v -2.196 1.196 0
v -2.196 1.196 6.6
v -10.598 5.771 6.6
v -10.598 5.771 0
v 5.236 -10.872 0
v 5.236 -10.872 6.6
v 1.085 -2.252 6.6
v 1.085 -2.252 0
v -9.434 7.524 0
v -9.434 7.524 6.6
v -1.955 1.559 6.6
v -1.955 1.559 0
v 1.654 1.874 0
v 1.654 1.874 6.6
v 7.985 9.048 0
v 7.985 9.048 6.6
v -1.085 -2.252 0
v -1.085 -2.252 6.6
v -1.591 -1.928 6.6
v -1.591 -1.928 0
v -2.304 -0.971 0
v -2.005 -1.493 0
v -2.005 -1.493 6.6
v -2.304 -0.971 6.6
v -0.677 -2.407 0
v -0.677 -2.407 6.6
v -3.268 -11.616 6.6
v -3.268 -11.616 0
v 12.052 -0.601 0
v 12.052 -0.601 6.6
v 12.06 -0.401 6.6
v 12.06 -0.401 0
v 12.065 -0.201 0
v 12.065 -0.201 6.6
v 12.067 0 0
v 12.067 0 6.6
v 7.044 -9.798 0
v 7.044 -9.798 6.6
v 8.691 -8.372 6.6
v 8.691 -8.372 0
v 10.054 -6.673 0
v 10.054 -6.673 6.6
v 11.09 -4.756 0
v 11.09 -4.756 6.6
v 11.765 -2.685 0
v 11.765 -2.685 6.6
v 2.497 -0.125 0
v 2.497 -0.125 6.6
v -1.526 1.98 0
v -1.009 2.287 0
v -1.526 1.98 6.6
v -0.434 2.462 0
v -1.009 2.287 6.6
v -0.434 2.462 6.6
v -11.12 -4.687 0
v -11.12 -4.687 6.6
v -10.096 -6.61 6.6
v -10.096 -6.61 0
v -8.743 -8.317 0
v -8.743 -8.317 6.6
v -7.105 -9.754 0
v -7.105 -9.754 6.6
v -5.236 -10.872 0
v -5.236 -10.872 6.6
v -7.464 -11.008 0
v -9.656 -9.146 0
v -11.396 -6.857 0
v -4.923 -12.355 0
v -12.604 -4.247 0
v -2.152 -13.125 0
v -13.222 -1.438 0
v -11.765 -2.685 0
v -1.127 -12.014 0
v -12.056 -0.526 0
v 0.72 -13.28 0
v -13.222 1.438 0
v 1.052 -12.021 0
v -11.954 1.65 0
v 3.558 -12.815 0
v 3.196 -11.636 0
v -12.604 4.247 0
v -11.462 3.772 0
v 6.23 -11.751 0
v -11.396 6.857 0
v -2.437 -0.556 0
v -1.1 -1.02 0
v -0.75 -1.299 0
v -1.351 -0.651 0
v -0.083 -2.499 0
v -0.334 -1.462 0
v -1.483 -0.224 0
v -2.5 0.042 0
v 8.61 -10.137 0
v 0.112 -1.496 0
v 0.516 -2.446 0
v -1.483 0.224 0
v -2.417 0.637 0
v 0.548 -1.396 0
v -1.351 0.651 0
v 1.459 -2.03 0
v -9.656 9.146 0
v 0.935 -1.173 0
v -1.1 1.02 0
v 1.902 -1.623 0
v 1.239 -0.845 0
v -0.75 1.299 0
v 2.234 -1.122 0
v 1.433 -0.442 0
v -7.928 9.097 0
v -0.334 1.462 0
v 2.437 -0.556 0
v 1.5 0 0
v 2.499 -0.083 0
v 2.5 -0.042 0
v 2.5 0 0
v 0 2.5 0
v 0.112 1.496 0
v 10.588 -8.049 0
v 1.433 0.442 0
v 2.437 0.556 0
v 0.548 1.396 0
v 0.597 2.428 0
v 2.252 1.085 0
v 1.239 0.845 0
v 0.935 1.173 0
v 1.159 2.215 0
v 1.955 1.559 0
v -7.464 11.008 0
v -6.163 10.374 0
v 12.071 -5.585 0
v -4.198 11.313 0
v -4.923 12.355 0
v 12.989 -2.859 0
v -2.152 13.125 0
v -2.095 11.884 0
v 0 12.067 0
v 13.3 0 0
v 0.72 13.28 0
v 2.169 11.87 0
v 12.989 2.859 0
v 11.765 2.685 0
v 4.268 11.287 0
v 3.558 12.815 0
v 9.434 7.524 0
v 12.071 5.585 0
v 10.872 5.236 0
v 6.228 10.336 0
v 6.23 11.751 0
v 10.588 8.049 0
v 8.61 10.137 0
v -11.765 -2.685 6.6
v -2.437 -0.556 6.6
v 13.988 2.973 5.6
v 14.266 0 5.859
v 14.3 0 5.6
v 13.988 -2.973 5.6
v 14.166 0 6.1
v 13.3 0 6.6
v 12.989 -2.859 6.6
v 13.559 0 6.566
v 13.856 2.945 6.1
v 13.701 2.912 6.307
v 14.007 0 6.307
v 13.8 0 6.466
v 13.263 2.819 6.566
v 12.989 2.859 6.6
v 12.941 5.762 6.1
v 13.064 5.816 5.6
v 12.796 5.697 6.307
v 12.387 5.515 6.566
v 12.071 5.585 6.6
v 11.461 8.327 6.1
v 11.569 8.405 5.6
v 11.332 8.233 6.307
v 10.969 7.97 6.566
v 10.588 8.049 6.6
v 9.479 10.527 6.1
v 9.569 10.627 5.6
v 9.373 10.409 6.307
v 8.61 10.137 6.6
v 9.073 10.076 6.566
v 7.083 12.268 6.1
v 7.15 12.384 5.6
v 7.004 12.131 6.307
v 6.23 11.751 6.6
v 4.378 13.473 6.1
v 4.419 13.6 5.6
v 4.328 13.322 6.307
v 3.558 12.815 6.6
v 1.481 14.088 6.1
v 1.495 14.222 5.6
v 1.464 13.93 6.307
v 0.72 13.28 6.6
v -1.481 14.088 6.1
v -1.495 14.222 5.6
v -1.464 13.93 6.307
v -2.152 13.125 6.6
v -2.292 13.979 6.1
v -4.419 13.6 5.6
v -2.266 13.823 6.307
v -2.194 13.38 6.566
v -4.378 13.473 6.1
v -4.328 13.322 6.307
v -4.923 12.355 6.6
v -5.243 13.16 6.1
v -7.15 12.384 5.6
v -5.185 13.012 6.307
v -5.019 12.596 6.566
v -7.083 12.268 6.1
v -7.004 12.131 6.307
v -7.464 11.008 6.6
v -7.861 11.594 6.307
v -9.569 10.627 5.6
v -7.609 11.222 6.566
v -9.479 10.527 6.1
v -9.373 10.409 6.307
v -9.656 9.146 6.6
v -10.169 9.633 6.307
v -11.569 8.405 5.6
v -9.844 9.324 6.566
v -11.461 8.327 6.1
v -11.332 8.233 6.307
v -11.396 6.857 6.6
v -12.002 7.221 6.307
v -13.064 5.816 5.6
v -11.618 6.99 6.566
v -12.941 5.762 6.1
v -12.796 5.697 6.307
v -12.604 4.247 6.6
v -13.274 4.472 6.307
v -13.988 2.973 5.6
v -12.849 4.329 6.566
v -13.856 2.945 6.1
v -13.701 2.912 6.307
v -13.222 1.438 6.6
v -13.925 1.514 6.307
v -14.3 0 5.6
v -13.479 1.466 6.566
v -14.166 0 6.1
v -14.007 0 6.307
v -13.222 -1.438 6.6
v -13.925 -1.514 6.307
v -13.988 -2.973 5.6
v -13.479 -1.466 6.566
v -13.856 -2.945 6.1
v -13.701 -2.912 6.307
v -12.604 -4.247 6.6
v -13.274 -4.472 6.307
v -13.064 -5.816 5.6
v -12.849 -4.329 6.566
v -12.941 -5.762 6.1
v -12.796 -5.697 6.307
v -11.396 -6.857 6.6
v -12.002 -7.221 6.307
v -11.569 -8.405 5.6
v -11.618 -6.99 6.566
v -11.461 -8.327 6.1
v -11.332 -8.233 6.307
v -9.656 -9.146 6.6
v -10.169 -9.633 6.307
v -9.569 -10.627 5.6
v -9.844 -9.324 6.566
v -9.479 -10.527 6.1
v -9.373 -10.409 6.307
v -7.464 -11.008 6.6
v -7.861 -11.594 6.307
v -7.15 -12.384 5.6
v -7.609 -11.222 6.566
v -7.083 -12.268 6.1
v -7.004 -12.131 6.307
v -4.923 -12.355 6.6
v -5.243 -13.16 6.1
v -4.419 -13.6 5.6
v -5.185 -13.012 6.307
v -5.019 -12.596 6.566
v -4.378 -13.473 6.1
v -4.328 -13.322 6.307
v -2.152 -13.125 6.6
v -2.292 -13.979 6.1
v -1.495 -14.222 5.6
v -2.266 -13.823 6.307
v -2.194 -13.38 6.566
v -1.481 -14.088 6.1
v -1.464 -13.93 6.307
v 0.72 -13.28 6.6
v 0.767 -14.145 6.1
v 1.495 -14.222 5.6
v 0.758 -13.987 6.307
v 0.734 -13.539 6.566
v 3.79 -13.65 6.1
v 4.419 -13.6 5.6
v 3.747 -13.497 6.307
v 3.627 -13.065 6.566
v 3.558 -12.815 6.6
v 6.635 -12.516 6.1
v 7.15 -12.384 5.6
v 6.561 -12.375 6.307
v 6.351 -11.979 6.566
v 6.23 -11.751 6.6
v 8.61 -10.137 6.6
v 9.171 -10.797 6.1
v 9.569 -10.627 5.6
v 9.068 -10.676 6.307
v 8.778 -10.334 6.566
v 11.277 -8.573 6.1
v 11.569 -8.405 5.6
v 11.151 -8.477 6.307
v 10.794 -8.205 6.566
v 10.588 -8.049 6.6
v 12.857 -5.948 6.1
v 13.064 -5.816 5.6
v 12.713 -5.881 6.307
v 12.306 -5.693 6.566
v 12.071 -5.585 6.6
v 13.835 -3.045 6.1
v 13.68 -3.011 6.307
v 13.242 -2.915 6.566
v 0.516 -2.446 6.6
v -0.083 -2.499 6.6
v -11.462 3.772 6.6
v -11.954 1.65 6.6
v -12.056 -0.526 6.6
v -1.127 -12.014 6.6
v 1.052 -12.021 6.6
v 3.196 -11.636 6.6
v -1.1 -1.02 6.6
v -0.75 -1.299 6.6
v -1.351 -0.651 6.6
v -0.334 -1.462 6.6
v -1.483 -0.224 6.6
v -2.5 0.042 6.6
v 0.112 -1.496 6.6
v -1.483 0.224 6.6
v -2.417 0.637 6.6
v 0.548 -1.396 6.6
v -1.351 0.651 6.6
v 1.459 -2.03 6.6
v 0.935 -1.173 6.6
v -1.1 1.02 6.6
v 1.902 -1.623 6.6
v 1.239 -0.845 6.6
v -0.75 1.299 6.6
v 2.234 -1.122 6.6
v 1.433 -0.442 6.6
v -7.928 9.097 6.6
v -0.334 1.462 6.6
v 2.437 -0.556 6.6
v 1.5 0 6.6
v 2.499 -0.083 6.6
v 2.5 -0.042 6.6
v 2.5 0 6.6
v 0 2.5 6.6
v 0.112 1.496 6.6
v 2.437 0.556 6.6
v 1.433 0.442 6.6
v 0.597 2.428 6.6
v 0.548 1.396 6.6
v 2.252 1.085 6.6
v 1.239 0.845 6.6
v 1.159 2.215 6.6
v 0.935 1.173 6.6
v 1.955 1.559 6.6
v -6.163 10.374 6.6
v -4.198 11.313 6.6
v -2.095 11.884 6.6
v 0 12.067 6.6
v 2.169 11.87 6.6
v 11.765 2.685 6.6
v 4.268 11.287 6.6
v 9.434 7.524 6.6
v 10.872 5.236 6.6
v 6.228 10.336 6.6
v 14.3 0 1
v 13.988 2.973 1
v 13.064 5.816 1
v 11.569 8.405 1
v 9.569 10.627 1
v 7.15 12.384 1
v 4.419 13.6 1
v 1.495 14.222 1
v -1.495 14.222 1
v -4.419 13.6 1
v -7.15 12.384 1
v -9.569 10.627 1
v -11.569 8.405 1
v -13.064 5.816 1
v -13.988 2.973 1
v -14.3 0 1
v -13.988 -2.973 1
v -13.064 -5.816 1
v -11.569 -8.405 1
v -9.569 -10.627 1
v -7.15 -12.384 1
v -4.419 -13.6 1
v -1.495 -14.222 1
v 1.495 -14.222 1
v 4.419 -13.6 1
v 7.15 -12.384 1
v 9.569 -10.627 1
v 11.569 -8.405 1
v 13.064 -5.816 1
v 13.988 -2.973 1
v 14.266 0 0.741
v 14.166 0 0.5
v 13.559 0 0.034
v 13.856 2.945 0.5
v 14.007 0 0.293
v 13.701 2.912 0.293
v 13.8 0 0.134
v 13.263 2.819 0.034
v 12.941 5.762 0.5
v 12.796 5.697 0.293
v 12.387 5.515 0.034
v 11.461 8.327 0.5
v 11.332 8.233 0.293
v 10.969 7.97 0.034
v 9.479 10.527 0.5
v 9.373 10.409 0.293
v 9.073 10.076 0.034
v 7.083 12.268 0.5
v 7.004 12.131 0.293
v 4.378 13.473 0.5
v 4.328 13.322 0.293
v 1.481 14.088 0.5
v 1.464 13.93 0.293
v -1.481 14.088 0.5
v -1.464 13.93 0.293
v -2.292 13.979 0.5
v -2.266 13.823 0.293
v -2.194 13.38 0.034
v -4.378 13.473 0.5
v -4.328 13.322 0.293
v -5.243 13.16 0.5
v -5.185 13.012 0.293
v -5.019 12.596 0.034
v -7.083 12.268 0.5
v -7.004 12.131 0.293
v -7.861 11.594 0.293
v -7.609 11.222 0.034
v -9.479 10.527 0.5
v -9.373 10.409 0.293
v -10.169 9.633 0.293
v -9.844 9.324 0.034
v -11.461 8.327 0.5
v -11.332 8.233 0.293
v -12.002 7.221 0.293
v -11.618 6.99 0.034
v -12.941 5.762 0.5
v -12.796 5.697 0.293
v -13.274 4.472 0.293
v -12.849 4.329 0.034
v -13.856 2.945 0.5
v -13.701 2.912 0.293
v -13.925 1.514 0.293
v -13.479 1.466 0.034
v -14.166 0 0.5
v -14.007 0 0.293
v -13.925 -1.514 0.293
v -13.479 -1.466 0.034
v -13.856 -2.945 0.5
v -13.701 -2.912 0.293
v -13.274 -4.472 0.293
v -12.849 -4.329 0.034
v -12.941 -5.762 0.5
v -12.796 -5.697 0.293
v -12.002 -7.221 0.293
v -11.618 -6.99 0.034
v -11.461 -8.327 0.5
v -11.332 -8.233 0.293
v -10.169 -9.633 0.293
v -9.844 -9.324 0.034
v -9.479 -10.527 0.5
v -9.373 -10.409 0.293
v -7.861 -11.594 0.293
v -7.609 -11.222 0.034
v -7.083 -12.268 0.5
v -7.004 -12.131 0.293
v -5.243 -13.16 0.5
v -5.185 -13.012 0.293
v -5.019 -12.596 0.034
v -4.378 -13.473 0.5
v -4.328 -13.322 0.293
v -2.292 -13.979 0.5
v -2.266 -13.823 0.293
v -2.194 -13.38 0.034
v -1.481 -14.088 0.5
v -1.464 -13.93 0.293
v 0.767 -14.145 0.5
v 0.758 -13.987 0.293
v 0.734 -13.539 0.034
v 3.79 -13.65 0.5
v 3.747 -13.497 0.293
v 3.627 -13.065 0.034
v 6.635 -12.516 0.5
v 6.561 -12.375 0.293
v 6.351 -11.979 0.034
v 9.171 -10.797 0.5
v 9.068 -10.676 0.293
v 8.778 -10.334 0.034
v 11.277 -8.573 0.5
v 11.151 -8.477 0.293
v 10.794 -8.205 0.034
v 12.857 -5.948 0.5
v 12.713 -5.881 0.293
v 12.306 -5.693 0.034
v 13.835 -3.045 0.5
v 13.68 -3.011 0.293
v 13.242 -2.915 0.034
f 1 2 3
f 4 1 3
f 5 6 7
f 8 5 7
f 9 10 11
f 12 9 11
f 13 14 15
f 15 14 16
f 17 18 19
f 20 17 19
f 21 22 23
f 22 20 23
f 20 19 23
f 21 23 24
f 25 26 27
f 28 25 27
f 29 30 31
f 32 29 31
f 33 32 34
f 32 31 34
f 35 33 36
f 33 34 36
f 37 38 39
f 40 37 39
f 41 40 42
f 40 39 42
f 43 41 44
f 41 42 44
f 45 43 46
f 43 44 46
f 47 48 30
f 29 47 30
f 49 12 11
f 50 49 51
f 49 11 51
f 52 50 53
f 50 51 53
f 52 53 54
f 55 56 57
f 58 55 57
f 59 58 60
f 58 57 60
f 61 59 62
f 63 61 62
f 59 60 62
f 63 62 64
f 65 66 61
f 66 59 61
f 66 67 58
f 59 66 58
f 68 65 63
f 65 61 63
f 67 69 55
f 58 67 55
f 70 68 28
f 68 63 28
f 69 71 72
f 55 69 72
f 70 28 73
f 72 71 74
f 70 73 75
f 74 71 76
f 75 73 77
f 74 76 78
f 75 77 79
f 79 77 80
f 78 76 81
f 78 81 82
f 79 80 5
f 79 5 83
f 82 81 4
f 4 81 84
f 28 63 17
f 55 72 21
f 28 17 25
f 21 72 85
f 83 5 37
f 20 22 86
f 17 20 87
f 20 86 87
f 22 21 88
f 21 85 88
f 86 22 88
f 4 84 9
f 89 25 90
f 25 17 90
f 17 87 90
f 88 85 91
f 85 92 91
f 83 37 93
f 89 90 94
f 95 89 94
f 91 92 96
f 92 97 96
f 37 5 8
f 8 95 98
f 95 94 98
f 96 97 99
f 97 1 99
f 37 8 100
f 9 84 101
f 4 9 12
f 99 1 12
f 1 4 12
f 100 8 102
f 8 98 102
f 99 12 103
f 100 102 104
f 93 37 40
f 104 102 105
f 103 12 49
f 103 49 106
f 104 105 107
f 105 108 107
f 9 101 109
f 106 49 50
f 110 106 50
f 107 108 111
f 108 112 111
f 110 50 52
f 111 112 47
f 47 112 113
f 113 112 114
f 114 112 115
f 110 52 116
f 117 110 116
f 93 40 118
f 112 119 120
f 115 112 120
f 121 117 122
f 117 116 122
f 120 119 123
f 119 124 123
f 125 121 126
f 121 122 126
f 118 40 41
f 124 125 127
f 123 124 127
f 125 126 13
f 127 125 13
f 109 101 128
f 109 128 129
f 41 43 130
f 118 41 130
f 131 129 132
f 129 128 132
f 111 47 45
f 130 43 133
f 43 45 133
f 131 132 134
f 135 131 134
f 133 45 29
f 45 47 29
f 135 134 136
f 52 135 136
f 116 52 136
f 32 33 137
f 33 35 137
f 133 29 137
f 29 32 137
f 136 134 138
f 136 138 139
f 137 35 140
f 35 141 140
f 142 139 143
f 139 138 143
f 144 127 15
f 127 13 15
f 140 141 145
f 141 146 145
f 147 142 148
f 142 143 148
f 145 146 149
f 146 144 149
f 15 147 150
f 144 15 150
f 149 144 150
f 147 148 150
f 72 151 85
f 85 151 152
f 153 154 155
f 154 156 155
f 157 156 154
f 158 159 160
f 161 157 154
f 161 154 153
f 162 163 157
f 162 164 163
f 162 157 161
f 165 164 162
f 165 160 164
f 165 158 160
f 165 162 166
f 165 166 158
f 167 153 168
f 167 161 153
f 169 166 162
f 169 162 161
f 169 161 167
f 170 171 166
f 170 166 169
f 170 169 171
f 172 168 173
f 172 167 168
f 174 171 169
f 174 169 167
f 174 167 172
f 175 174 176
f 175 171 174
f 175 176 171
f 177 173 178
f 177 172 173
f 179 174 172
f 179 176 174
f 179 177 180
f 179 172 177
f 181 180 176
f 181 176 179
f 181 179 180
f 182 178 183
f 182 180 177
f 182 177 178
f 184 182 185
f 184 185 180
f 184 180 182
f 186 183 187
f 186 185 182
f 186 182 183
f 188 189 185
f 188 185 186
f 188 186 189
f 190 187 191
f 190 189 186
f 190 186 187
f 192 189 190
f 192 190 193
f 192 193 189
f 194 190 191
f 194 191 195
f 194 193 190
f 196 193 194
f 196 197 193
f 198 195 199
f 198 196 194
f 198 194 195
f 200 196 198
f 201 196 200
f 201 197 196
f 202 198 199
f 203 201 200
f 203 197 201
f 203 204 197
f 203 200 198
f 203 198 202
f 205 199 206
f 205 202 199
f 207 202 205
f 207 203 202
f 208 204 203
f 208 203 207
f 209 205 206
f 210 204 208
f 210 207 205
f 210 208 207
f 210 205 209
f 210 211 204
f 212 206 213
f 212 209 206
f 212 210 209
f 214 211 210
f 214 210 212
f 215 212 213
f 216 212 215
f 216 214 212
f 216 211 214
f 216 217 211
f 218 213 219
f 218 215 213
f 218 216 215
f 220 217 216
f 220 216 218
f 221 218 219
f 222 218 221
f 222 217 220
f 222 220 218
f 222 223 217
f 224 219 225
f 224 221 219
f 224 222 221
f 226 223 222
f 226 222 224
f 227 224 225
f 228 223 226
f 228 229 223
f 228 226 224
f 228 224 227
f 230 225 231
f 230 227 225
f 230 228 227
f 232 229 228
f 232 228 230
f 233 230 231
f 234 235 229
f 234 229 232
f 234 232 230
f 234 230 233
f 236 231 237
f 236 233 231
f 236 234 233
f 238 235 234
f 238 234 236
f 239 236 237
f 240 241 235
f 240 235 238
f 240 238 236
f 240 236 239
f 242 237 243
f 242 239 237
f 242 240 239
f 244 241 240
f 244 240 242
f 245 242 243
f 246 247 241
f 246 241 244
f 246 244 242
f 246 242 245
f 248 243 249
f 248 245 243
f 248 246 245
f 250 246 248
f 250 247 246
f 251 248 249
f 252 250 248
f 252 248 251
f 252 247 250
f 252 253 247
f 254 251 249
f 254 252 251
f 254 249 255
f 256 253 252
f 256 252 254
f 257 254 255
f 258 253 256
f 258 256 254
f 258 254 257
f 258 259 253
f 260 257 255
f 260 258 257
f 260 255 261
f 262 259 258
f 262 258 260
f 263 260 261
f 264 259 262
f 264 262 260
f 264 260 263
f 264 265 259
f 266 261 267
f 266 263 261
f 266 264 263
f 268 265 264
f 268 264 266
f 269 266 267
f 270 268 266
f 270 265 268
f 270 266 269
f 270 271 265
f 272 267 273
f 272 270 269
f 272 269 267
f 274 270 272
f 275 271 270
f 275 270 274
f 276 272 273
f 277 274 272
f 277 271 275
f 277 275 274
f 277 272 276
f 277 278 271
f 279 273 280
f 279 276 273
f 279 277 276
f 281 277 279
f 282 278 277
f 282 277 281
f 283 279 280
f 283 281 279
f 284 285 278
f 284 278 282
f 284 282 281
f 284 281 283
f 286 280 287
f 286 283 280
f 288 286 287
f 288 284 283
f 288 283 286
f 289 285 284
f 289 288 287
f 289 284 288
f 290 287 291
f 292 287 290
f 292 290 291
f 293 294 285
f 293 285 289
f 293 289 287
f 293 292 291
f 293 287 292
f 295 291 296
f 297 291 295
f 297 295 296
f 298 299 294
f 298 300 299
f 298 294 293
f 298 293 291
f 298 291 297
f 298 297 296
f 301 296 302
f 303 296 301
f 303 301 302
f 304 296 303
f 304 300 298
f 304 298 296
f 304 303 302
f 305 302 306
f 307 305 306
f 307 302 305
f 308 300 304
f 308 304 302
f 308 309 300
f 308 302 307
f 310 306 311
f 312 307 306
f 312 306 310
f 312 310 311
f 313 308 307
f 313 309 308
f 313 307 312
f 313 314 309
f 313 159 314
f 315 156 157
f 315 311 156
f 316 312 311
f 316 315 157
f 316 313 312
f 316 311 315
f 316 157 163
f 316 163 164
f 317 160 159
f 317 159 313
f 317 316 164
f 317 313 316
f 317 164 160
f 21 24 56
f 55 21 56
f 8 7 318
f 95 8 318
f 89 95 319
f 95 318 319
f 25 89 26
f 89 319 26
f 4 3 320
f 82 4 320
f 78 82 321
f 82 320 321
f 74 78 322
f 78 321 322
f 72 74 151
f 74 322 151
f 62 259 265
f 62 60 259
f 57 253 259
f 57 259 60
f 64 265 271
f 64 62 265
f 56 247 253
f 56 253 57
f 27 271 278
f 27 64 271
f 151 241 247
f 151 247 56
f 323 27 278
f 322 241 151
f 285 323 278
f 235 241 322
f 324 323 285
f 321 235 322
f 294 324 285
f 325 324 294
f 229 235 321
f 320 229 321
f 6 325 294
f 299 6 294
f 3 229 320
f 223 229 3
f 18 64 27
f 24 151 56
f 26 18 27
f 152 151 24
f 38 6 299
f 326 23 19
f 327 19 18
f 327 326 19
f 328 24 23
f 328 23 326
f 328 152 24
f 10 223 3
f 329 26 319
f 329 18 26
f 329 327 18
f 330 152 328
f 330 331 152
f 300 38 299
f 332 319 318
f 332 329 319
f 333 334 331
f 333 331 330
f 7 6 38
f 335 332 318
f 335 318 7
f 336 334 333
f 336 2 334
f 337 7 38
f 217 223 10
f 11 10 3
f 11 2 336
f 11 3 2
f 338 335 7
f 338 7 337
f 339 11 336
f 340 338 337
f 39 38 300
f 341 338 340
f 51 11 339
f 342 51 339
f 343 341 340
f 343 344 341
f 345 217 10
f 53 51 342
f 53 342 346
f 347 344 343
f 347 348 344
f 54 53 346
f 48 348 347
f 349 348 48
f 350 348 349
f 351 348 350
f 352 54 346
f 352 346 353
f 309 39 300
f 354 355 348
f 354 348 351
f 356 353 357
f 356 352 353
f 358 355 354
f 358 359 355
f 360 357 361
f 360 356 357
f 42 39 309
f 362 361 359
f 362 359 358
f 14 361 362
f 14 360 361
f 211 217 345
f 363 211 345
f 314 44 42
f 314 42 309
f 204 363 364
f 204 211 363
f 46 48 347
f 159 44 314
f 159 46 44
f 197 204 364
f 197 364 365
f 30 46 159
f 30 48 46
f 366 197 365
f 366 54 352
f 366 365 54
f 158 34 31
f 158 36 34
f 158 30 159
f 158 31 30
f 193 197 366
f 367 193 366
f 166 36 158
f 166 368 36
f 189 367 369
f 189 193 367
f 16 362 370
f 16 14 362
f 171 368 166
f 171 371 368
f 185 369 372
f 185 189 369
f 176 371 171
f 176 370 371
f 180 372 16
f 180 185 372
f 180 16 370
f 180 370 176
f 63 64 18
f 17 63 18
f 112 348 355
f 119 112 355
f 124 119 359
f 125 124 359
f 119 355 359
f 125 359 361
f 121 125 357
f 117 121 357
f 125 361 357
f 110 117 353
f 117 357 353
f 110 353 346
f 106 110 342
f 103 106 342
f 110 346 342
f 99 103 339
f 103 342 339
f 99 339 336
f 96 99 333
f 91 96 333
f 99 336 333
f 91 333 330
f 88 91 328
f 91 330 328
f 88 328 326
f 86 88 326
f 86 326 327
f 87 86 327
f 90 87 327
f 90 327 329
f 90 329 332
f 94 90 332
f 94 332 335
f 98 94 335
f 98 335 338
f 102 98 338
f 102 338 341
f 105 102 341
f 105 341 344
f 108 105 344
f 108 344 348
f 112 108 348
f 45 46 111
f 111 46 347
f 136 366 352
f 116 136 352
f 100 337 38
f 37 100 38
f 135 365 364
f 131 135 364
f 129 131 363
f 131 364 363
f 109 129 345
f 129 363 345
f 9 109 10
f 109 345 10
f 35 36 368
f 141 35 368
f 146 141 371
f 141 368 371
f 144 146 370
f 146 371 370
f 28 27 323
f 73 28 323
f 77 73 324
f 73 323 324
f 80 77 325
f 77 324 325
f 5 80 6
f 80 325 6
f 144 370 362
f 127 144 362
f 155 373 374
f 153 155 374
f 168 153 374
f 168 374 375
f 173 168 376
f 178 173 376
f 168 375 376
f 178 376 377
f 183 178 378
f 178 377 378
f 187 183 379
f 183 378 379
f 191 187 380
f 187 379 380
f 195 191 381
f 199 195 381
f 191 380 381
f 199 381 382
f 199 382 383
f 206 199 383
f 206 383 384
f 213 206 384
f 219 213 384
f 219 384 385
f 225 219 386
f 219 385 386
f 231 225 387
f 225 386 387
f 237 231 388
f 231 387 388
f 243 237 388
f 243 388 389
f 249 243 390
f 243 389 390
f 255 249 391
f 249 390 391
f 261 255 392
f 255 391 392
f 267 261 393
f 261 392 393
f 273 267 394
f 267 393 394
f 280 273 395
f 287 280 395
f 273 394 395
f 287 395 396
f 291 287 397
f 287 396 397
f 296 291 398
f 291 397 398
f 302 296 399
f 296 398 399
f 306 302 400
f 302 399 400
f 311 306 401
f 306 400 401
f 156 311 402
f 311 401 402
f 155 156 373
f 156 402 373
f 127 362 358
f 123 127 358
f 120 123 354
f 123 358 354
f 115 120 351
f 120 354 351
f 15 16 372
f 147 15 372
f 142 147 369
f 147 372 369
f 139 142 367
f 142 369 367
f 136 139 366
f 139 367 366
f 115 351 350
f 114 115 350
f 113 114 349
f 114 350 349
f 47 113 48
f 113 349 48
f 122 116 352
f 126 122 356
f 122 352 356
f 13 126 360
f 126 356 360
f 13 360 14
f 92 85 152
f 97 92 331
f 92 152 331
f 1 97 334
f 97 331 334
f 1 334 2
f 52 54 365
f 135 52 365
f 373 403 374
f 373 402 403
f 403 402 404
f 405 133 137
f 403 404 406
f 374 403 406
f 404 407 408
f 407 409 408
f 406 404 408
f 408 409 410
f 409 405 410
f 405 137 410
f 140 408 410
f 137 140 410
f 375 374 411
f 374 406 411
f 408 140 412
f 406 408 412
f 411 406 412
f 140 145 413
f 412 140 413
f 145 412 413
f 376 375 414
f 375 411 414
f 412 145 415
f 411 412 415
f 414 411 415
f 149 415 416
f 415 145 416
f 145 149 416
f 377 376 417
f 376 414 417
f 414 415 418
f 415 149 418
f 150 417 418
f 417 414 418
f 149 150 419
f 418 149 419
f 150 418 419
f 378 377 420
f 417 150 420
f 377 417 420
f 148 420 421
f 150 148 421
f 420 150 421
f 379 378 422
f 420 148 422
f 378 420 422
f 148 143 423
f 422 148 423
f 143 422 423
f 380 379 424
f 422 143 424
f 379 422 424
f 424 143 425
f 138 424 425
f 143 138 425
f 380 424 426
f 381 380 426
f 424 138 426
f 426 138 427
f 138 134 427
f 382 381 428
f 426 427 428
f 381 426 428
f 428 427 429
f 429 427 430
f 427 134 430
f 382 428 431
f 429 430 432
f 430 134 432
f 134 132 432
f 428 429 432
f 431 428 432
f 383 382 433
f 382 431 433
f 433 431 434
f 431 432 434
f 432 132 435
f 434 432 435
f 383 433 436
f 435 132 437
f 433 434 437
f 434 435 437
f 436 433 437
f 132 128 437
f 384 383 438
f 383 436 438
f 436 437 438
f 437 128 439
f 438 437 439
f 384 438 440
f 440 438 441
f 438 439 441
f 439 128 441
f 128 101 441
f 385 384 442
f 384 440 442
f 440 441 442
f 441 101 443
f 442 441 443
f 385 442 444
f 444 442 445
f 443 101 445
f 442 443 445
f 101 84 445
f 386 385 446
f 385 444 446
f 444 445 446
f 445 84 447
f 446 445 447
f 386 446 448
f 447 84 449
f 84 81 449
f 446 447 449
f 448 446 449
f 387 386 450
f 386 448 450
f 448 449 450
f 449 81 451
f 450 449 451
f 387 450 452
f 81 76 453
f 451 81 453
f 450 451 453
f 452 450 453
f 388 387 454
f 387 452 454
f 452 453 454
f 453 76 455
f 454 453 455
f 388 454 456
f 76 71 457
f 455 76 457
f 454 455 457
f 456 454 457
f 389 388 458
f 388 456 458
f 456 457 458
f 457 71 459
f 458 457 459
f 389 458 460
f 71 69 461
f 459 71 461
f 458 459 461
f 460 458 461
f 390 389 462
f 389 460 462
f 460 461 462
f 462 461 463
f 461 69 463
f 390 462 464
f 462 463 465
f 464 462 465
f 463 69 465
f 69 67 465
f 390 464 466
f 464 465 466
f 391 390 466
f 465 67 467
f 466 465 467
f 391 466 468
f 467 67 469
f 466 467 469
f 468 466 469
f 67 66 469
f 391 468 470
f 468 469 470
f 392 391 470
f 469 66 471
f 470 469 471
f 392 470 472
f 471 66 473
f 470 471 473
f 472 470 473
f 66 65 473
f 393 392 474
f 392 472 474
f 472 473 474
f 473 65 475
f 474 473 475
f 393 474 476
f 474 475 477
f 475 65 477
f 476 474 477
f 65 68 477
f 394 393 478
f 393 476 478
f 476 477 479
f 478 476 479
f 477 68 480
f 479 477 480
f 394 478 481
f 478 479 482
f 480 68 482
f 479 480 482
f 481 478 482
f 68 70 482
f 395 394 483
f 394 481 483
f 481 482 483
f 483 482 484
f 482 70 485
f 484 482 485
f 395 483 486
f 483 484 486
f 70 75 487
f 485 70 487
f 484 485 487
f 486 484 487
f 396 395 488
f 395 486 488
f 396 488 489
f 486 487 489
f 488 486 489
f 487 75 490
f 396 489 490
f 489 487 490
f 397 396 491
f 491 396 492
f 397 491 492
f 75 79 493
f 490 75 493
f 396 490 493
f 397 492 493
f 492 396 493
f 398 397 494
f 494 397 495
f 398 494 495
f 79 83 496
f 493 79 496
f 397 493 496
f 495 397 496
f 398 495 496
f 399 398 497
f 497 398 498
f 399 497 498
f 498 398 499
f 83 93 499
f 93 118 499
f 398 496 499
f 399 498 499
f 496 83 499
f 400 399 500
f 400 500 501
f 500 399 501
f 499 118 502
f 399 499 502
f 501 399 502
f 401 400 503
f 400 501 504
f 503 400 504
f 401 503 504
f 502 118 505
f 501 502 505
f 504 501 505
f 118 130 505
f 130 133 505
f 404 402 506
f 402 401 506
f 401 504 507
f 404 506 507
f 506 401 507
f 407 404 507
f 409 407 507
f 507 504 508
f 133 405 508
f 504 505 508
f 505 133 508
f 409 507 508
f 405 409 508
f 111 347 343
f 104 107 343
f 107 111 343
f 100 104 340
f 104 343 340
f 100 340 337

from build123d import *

# Parameters (mm, degrees)
SKETCH1_R           = 14.3
BOSS_EXTRUDE1_DEPTH = 6.6
FILLET1_R           = 1
FILLET2_R           = 1
CUT_EXTRUDE1_DEPTH  = 10
SKETCH3_R           = 1.5
CUT_EXTRUDE2_DEPTH  = 10


with BuildPart() as part:
    # Sketch1 → Boss-Extrude1 (new body)
    with BuildSketch(Plane.XY):
        Circle(SKETCH1_R)
    extrude(amount=BOSS_EXTRUDE1_DEPTH)

    # Fillet1
    fillet1_edges = [part.edges().sort_by_distance(p)[0] for p in [
        (-14.3, 0, 6.6),
    ]]
    fillet(fillet1_edges, radius=FILLET1_R)

    # Fillet2
    fillet2_edges = [part.edges().sort_by_distance(p)[0] for p in [
        (-14.3, 0, 0),
    ]]
    fillet(fillet2_edges, radius=FILLET2_R)

    # Sketch2 → Cut-Extrude1 (cut)
    with BuildSketch(Plane.XY.offset(6.6)):
        with BuildLine():
            ThreePointArc((-1.954578706, 1.558724505), (-1.276893228, 2.149312375), (-0.434120444, 2.462019383))
            Line((-0.434120444, 2.462019383), (-2.095426853, 11.883756218))
            ThreePointArc((-2.095426853, 11.883756218), (-6.163350277, 10.374371736), (-9.434424854, 7.52370276))
            Line((-9.434424854, 7.52370276), (-1.954578706, 1.558724505))
        make_face()
        with BuildLine():
            ThreePointArc((-2.43731978, -0.556302335), (-2.476529986, 0.341759021), (-2.195553933, 1.195634947))
            Line((-2.195553933, 1.195634947), (-10.597572015, 5.771130126))
            ThreePointArc((-10.597572015, 5.771130126), (-11.953796477, 1.649613694), (-11.764535365, -2.685178426))
            Line((-11.764535365, -2.685178426), (-2.43731978, -0.556302335))
        make_face()
        with BuildLine():
            ThreePointArc((-1.084709348, -2.25242217), (-1.811289152, -1.723145846), (-2.30369053, -0.971086991))
            Line((-2.30369053, -0.971086991), (-11.119529298, -4.68727466))
            ThreePointArc((-11.119529298, -4.68727466), (-8.742790117, -8.317337105), (-5.235710794, -10.87206549))
            Line((-5.235710794, -10.87206549), (-1.084709348, -2.25242217))
        make_face()
        with BuildLine():
            Line((5.235710794, -10.87206549), (1.084709348, -2.25242217))
            ThreePointArc((1.084709348, -2.25242217), (0.217889357, -2.490486745), (-0.67710117, -2.406560617))
            Line((-0.67710117, -2.406560617), (-3.268254223, -11.616066024))
            ThreePointArc((-3.268254223, -11.616066024), (1.051715522, -12.021163422), (5.235710794, -10.87206549))
        make_face()
        with BuildLine():
            Line((11.764535365, -2.685178426), (2.43731978, -0.556302335))
            ThreePointArc((2.43731978, -0.556302335), (2.082992736, -1.382440328), (1.459359181, -2.029845014))
            Line((1.459359181, -2.029845014), (7.044082942, -9.797722748))
            ThreePointArc((7.044082942, -9.797722748), (10.054257921, -6.672808494), (11.764535365, -2.685178426))
        make_face()
        with BuildLine():
            Line((9.434424854, 7.52370276), (1.954578706, 1.558724505))
            ThreePointArc((1.954578706, 1.558724505), (2.359708326, 0.825697655), (2.5, 0))
            ThreePointArc((2.5, 0), (2.499222955, -0.062326729), (2.496892303, -0.124614714))
            Line((2.496892303, -0.124614714), (12.052081979, -0.601494405))
            ThreePointArc((12.052081979, -0.601494405), (12.063331646, -0.300840709), (12.067082313, 0))
            ThreePointArc((12.067082313, 0), (11.389917841, 3.985504627), (9.434424854, 7.52370276))
        make_face()
        with BuildLine():
            Line((0, 12.067082313), (0, 2.5))
            ThreePointArc((0, 2.5), (0.884270174, 2.338389672), (1.654214594, 1.874453007))
            Line((1.654214594, 1.874453007), (7.984617468, 9.047671493))
            ThreePointArc((7.984617468, 9.047671493), (4.268224391, 11.287016262), (0, 12.067082313))
        make_face()
    extrude(amount=-CUT_EXTRUDE1_DEPTH, mode=Mode.SUBTRACT)

    # Sketch3 → Cut-Extrude2 (cut)
    with BuildSketch(Plane.XY.offset(6.6)):
        Circle(SKETCH3_R)
    extrude(amount=-CUT_EXTRUDE2_DEPTH, mode=Mode.SUBTRACT)


solid = part.part
